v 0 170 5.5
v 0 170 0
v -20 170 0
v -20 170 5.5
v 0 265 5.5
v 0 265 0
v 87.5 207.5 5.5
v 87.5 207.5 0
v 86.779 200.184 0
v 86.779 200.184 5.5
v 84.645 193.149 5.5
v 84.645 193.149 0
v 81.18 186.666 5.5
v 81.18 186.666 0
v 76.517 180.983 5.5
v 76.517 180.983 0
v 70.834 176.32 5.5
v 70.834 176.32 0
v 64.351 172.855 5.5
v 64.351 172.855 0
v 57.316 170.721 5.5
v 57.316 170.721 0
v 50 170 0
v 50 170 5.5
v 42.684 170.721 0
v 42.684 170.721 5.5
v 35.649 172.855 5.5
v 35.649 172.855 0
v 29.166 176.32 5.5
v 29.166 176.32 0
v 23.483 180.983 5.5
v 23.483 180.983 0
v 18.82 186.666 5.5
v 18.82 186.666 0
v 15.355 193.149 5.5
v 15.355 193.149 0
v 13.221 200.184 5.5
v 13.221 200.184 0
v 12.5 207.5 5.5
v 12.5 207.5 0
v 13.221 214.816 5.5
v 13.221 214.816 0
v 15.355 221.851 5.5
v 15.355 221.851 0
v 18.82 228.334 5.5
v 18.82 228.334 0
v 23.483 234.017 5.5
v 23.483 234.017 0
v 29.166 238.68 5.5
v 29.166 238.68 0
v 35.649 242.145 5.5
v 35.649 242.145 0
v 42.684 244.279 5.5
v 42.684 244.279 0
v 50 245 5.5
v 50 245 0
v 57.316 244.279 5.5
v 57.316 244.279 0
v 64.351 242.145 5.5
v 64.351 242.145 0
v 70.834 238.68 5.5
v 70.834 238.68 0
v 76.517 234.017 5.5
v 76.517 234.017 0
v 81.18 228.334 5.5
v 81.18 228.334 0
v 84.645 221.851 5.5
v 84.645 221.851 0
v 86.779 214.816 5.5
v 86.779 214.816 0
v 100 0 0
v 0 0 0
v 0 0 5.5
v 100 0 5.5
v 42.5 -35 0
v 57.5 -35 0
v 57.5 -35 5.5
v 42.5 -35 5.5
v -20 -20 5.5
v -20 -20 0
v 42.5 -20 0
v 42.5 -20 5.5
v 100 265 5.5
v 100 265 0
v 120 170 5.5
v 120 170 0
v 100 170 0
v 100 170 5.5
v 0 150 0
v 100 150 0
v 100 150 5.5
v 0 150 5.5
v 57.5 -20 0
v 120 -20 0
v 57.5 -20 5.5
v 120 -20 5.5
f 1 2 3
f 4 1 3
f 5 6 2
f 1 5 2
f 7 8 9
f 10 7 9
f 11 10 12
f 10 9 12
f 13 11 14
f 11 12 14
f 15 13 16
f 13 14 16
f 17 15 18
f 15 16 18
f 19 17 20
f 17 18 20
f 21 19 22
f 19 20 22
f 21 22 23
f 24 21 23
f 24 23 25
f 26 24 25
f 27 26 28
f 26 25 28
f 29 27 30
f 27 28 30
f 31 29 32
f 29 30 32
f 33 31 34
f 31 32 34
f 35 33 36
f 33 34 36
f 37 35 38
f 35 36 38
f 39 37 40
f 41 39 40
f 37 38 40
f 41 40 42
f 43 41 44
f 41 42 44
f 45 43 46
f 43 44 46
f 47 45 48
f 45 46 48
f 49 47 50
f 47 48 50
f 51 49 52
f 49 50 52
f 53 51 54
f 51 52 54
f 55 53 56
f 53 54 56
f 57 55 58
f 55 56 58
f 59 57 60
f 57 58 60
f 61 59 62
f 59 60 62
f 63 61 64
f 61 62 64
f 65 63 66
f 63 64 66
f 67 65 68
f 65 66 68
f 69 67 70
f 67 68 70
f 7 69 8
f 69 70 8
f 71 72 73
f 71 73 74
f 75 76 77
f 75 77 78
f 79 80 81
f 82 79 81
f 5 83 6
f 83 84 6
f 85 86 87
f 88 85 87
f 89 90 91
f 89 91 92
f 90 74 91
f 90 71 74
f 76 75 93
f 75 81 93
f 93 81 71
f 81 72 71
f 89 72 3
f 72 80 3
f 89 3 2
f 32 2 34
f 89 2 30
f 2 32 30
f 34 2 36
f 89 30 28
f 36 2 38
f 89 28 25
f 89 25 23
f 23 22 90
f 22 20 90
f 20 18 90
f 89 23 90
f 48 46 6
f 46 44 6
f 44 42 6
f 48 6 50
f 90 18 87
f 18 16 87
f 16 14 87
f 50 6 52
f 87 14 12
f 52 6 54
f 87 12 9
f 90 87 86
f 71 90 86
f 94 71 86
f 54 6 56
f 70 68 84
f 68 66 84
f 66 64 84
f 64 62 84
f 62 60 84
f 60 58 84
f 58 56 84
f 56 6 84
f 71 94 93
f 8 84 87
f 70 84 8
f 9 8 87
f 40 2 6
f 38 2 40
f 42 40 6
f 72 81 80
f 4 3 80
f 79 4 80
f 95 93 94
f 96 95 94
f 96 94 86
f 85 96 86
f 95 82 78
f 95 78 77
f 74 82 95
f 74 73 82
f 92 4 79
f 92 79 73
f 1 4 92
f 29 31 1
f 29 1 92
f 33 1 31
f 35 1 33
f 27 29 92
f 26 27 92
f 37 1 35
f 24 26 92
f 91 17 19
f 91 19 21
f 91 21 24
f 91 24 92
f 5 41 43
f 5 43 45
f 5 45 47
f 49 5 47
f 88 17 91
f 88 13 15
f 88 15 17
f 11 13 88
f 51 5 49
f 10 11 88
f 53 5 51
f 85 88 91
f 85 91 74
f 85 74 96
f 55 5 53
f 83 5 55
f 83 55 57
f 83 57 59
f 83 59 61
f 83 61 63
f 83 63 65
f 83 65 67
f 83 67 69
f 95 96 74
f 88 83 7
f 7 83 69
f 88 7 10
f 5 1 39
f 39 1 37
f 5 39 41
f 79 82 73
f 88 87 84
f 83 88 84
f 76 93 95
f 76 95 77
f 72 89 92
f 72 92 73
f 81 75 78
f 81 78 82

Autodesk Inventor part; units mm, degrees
ref_plane "YZ Plane" through (0, 0, 0) normal (1, 0, 0) x (0, 1, 0)
ref_plane "XZ Plane" through (0, 0, 0) normal (0, 1, 0) x (-1, 0, 0)
ref_plane "XY Plane" through (0, 0, 0) normal (0, 0, 1) x (1, 0, 0)
sketch "Sketch1" plane through (0, 0, 0) normal (0, 0, 1) x (1, 0, 0)
  line L0 (0, 0) -> (100, 0)
  line L1 (100, 0) -> (100, 150)
  line L2 (100, 150) -> (0, 150)
  line L3 (0, 150) -> (0, 0)
  circle A0 centre (50, 207.5) radius 37.5
  line L4 (-20, -20) -> (120, -20)
  line L5 (120, -20) -> (120, 170)
  line L6 (120, 170) -> (-20, 170)
  line L7 (-20, 170) -> (-20, -20)
  line L8 (0, 170) -> (100, 170)
  line L9 (100, 170) -> (100, 265)
  line L10 (100, 265) -> (0, 265)
  line L11 (0, 265) -> (0, 170)
  line L12 (49.5, -20) -> (59.5, -20)
  line L13 (45, -20) -> (60, -20)
  line L14 (42.5, -20) -> (57.5, -20)
  line L15 (57.5, -20) -> (57.5, -35)
  line L16 (57.5, -35) -> (42.5, -35)
  line L17 (42.5, -35) -> (42.5, -20)
  dimension "d4" = 75
  dimension "d5" = 140
  dimension "d6" = 95
  dimension "d13" = 15
  dimension "d14" = 15
extrude "Extrusion1" add sketch "Sketch1" along normal blind 5.5
properties part number "anillo"
